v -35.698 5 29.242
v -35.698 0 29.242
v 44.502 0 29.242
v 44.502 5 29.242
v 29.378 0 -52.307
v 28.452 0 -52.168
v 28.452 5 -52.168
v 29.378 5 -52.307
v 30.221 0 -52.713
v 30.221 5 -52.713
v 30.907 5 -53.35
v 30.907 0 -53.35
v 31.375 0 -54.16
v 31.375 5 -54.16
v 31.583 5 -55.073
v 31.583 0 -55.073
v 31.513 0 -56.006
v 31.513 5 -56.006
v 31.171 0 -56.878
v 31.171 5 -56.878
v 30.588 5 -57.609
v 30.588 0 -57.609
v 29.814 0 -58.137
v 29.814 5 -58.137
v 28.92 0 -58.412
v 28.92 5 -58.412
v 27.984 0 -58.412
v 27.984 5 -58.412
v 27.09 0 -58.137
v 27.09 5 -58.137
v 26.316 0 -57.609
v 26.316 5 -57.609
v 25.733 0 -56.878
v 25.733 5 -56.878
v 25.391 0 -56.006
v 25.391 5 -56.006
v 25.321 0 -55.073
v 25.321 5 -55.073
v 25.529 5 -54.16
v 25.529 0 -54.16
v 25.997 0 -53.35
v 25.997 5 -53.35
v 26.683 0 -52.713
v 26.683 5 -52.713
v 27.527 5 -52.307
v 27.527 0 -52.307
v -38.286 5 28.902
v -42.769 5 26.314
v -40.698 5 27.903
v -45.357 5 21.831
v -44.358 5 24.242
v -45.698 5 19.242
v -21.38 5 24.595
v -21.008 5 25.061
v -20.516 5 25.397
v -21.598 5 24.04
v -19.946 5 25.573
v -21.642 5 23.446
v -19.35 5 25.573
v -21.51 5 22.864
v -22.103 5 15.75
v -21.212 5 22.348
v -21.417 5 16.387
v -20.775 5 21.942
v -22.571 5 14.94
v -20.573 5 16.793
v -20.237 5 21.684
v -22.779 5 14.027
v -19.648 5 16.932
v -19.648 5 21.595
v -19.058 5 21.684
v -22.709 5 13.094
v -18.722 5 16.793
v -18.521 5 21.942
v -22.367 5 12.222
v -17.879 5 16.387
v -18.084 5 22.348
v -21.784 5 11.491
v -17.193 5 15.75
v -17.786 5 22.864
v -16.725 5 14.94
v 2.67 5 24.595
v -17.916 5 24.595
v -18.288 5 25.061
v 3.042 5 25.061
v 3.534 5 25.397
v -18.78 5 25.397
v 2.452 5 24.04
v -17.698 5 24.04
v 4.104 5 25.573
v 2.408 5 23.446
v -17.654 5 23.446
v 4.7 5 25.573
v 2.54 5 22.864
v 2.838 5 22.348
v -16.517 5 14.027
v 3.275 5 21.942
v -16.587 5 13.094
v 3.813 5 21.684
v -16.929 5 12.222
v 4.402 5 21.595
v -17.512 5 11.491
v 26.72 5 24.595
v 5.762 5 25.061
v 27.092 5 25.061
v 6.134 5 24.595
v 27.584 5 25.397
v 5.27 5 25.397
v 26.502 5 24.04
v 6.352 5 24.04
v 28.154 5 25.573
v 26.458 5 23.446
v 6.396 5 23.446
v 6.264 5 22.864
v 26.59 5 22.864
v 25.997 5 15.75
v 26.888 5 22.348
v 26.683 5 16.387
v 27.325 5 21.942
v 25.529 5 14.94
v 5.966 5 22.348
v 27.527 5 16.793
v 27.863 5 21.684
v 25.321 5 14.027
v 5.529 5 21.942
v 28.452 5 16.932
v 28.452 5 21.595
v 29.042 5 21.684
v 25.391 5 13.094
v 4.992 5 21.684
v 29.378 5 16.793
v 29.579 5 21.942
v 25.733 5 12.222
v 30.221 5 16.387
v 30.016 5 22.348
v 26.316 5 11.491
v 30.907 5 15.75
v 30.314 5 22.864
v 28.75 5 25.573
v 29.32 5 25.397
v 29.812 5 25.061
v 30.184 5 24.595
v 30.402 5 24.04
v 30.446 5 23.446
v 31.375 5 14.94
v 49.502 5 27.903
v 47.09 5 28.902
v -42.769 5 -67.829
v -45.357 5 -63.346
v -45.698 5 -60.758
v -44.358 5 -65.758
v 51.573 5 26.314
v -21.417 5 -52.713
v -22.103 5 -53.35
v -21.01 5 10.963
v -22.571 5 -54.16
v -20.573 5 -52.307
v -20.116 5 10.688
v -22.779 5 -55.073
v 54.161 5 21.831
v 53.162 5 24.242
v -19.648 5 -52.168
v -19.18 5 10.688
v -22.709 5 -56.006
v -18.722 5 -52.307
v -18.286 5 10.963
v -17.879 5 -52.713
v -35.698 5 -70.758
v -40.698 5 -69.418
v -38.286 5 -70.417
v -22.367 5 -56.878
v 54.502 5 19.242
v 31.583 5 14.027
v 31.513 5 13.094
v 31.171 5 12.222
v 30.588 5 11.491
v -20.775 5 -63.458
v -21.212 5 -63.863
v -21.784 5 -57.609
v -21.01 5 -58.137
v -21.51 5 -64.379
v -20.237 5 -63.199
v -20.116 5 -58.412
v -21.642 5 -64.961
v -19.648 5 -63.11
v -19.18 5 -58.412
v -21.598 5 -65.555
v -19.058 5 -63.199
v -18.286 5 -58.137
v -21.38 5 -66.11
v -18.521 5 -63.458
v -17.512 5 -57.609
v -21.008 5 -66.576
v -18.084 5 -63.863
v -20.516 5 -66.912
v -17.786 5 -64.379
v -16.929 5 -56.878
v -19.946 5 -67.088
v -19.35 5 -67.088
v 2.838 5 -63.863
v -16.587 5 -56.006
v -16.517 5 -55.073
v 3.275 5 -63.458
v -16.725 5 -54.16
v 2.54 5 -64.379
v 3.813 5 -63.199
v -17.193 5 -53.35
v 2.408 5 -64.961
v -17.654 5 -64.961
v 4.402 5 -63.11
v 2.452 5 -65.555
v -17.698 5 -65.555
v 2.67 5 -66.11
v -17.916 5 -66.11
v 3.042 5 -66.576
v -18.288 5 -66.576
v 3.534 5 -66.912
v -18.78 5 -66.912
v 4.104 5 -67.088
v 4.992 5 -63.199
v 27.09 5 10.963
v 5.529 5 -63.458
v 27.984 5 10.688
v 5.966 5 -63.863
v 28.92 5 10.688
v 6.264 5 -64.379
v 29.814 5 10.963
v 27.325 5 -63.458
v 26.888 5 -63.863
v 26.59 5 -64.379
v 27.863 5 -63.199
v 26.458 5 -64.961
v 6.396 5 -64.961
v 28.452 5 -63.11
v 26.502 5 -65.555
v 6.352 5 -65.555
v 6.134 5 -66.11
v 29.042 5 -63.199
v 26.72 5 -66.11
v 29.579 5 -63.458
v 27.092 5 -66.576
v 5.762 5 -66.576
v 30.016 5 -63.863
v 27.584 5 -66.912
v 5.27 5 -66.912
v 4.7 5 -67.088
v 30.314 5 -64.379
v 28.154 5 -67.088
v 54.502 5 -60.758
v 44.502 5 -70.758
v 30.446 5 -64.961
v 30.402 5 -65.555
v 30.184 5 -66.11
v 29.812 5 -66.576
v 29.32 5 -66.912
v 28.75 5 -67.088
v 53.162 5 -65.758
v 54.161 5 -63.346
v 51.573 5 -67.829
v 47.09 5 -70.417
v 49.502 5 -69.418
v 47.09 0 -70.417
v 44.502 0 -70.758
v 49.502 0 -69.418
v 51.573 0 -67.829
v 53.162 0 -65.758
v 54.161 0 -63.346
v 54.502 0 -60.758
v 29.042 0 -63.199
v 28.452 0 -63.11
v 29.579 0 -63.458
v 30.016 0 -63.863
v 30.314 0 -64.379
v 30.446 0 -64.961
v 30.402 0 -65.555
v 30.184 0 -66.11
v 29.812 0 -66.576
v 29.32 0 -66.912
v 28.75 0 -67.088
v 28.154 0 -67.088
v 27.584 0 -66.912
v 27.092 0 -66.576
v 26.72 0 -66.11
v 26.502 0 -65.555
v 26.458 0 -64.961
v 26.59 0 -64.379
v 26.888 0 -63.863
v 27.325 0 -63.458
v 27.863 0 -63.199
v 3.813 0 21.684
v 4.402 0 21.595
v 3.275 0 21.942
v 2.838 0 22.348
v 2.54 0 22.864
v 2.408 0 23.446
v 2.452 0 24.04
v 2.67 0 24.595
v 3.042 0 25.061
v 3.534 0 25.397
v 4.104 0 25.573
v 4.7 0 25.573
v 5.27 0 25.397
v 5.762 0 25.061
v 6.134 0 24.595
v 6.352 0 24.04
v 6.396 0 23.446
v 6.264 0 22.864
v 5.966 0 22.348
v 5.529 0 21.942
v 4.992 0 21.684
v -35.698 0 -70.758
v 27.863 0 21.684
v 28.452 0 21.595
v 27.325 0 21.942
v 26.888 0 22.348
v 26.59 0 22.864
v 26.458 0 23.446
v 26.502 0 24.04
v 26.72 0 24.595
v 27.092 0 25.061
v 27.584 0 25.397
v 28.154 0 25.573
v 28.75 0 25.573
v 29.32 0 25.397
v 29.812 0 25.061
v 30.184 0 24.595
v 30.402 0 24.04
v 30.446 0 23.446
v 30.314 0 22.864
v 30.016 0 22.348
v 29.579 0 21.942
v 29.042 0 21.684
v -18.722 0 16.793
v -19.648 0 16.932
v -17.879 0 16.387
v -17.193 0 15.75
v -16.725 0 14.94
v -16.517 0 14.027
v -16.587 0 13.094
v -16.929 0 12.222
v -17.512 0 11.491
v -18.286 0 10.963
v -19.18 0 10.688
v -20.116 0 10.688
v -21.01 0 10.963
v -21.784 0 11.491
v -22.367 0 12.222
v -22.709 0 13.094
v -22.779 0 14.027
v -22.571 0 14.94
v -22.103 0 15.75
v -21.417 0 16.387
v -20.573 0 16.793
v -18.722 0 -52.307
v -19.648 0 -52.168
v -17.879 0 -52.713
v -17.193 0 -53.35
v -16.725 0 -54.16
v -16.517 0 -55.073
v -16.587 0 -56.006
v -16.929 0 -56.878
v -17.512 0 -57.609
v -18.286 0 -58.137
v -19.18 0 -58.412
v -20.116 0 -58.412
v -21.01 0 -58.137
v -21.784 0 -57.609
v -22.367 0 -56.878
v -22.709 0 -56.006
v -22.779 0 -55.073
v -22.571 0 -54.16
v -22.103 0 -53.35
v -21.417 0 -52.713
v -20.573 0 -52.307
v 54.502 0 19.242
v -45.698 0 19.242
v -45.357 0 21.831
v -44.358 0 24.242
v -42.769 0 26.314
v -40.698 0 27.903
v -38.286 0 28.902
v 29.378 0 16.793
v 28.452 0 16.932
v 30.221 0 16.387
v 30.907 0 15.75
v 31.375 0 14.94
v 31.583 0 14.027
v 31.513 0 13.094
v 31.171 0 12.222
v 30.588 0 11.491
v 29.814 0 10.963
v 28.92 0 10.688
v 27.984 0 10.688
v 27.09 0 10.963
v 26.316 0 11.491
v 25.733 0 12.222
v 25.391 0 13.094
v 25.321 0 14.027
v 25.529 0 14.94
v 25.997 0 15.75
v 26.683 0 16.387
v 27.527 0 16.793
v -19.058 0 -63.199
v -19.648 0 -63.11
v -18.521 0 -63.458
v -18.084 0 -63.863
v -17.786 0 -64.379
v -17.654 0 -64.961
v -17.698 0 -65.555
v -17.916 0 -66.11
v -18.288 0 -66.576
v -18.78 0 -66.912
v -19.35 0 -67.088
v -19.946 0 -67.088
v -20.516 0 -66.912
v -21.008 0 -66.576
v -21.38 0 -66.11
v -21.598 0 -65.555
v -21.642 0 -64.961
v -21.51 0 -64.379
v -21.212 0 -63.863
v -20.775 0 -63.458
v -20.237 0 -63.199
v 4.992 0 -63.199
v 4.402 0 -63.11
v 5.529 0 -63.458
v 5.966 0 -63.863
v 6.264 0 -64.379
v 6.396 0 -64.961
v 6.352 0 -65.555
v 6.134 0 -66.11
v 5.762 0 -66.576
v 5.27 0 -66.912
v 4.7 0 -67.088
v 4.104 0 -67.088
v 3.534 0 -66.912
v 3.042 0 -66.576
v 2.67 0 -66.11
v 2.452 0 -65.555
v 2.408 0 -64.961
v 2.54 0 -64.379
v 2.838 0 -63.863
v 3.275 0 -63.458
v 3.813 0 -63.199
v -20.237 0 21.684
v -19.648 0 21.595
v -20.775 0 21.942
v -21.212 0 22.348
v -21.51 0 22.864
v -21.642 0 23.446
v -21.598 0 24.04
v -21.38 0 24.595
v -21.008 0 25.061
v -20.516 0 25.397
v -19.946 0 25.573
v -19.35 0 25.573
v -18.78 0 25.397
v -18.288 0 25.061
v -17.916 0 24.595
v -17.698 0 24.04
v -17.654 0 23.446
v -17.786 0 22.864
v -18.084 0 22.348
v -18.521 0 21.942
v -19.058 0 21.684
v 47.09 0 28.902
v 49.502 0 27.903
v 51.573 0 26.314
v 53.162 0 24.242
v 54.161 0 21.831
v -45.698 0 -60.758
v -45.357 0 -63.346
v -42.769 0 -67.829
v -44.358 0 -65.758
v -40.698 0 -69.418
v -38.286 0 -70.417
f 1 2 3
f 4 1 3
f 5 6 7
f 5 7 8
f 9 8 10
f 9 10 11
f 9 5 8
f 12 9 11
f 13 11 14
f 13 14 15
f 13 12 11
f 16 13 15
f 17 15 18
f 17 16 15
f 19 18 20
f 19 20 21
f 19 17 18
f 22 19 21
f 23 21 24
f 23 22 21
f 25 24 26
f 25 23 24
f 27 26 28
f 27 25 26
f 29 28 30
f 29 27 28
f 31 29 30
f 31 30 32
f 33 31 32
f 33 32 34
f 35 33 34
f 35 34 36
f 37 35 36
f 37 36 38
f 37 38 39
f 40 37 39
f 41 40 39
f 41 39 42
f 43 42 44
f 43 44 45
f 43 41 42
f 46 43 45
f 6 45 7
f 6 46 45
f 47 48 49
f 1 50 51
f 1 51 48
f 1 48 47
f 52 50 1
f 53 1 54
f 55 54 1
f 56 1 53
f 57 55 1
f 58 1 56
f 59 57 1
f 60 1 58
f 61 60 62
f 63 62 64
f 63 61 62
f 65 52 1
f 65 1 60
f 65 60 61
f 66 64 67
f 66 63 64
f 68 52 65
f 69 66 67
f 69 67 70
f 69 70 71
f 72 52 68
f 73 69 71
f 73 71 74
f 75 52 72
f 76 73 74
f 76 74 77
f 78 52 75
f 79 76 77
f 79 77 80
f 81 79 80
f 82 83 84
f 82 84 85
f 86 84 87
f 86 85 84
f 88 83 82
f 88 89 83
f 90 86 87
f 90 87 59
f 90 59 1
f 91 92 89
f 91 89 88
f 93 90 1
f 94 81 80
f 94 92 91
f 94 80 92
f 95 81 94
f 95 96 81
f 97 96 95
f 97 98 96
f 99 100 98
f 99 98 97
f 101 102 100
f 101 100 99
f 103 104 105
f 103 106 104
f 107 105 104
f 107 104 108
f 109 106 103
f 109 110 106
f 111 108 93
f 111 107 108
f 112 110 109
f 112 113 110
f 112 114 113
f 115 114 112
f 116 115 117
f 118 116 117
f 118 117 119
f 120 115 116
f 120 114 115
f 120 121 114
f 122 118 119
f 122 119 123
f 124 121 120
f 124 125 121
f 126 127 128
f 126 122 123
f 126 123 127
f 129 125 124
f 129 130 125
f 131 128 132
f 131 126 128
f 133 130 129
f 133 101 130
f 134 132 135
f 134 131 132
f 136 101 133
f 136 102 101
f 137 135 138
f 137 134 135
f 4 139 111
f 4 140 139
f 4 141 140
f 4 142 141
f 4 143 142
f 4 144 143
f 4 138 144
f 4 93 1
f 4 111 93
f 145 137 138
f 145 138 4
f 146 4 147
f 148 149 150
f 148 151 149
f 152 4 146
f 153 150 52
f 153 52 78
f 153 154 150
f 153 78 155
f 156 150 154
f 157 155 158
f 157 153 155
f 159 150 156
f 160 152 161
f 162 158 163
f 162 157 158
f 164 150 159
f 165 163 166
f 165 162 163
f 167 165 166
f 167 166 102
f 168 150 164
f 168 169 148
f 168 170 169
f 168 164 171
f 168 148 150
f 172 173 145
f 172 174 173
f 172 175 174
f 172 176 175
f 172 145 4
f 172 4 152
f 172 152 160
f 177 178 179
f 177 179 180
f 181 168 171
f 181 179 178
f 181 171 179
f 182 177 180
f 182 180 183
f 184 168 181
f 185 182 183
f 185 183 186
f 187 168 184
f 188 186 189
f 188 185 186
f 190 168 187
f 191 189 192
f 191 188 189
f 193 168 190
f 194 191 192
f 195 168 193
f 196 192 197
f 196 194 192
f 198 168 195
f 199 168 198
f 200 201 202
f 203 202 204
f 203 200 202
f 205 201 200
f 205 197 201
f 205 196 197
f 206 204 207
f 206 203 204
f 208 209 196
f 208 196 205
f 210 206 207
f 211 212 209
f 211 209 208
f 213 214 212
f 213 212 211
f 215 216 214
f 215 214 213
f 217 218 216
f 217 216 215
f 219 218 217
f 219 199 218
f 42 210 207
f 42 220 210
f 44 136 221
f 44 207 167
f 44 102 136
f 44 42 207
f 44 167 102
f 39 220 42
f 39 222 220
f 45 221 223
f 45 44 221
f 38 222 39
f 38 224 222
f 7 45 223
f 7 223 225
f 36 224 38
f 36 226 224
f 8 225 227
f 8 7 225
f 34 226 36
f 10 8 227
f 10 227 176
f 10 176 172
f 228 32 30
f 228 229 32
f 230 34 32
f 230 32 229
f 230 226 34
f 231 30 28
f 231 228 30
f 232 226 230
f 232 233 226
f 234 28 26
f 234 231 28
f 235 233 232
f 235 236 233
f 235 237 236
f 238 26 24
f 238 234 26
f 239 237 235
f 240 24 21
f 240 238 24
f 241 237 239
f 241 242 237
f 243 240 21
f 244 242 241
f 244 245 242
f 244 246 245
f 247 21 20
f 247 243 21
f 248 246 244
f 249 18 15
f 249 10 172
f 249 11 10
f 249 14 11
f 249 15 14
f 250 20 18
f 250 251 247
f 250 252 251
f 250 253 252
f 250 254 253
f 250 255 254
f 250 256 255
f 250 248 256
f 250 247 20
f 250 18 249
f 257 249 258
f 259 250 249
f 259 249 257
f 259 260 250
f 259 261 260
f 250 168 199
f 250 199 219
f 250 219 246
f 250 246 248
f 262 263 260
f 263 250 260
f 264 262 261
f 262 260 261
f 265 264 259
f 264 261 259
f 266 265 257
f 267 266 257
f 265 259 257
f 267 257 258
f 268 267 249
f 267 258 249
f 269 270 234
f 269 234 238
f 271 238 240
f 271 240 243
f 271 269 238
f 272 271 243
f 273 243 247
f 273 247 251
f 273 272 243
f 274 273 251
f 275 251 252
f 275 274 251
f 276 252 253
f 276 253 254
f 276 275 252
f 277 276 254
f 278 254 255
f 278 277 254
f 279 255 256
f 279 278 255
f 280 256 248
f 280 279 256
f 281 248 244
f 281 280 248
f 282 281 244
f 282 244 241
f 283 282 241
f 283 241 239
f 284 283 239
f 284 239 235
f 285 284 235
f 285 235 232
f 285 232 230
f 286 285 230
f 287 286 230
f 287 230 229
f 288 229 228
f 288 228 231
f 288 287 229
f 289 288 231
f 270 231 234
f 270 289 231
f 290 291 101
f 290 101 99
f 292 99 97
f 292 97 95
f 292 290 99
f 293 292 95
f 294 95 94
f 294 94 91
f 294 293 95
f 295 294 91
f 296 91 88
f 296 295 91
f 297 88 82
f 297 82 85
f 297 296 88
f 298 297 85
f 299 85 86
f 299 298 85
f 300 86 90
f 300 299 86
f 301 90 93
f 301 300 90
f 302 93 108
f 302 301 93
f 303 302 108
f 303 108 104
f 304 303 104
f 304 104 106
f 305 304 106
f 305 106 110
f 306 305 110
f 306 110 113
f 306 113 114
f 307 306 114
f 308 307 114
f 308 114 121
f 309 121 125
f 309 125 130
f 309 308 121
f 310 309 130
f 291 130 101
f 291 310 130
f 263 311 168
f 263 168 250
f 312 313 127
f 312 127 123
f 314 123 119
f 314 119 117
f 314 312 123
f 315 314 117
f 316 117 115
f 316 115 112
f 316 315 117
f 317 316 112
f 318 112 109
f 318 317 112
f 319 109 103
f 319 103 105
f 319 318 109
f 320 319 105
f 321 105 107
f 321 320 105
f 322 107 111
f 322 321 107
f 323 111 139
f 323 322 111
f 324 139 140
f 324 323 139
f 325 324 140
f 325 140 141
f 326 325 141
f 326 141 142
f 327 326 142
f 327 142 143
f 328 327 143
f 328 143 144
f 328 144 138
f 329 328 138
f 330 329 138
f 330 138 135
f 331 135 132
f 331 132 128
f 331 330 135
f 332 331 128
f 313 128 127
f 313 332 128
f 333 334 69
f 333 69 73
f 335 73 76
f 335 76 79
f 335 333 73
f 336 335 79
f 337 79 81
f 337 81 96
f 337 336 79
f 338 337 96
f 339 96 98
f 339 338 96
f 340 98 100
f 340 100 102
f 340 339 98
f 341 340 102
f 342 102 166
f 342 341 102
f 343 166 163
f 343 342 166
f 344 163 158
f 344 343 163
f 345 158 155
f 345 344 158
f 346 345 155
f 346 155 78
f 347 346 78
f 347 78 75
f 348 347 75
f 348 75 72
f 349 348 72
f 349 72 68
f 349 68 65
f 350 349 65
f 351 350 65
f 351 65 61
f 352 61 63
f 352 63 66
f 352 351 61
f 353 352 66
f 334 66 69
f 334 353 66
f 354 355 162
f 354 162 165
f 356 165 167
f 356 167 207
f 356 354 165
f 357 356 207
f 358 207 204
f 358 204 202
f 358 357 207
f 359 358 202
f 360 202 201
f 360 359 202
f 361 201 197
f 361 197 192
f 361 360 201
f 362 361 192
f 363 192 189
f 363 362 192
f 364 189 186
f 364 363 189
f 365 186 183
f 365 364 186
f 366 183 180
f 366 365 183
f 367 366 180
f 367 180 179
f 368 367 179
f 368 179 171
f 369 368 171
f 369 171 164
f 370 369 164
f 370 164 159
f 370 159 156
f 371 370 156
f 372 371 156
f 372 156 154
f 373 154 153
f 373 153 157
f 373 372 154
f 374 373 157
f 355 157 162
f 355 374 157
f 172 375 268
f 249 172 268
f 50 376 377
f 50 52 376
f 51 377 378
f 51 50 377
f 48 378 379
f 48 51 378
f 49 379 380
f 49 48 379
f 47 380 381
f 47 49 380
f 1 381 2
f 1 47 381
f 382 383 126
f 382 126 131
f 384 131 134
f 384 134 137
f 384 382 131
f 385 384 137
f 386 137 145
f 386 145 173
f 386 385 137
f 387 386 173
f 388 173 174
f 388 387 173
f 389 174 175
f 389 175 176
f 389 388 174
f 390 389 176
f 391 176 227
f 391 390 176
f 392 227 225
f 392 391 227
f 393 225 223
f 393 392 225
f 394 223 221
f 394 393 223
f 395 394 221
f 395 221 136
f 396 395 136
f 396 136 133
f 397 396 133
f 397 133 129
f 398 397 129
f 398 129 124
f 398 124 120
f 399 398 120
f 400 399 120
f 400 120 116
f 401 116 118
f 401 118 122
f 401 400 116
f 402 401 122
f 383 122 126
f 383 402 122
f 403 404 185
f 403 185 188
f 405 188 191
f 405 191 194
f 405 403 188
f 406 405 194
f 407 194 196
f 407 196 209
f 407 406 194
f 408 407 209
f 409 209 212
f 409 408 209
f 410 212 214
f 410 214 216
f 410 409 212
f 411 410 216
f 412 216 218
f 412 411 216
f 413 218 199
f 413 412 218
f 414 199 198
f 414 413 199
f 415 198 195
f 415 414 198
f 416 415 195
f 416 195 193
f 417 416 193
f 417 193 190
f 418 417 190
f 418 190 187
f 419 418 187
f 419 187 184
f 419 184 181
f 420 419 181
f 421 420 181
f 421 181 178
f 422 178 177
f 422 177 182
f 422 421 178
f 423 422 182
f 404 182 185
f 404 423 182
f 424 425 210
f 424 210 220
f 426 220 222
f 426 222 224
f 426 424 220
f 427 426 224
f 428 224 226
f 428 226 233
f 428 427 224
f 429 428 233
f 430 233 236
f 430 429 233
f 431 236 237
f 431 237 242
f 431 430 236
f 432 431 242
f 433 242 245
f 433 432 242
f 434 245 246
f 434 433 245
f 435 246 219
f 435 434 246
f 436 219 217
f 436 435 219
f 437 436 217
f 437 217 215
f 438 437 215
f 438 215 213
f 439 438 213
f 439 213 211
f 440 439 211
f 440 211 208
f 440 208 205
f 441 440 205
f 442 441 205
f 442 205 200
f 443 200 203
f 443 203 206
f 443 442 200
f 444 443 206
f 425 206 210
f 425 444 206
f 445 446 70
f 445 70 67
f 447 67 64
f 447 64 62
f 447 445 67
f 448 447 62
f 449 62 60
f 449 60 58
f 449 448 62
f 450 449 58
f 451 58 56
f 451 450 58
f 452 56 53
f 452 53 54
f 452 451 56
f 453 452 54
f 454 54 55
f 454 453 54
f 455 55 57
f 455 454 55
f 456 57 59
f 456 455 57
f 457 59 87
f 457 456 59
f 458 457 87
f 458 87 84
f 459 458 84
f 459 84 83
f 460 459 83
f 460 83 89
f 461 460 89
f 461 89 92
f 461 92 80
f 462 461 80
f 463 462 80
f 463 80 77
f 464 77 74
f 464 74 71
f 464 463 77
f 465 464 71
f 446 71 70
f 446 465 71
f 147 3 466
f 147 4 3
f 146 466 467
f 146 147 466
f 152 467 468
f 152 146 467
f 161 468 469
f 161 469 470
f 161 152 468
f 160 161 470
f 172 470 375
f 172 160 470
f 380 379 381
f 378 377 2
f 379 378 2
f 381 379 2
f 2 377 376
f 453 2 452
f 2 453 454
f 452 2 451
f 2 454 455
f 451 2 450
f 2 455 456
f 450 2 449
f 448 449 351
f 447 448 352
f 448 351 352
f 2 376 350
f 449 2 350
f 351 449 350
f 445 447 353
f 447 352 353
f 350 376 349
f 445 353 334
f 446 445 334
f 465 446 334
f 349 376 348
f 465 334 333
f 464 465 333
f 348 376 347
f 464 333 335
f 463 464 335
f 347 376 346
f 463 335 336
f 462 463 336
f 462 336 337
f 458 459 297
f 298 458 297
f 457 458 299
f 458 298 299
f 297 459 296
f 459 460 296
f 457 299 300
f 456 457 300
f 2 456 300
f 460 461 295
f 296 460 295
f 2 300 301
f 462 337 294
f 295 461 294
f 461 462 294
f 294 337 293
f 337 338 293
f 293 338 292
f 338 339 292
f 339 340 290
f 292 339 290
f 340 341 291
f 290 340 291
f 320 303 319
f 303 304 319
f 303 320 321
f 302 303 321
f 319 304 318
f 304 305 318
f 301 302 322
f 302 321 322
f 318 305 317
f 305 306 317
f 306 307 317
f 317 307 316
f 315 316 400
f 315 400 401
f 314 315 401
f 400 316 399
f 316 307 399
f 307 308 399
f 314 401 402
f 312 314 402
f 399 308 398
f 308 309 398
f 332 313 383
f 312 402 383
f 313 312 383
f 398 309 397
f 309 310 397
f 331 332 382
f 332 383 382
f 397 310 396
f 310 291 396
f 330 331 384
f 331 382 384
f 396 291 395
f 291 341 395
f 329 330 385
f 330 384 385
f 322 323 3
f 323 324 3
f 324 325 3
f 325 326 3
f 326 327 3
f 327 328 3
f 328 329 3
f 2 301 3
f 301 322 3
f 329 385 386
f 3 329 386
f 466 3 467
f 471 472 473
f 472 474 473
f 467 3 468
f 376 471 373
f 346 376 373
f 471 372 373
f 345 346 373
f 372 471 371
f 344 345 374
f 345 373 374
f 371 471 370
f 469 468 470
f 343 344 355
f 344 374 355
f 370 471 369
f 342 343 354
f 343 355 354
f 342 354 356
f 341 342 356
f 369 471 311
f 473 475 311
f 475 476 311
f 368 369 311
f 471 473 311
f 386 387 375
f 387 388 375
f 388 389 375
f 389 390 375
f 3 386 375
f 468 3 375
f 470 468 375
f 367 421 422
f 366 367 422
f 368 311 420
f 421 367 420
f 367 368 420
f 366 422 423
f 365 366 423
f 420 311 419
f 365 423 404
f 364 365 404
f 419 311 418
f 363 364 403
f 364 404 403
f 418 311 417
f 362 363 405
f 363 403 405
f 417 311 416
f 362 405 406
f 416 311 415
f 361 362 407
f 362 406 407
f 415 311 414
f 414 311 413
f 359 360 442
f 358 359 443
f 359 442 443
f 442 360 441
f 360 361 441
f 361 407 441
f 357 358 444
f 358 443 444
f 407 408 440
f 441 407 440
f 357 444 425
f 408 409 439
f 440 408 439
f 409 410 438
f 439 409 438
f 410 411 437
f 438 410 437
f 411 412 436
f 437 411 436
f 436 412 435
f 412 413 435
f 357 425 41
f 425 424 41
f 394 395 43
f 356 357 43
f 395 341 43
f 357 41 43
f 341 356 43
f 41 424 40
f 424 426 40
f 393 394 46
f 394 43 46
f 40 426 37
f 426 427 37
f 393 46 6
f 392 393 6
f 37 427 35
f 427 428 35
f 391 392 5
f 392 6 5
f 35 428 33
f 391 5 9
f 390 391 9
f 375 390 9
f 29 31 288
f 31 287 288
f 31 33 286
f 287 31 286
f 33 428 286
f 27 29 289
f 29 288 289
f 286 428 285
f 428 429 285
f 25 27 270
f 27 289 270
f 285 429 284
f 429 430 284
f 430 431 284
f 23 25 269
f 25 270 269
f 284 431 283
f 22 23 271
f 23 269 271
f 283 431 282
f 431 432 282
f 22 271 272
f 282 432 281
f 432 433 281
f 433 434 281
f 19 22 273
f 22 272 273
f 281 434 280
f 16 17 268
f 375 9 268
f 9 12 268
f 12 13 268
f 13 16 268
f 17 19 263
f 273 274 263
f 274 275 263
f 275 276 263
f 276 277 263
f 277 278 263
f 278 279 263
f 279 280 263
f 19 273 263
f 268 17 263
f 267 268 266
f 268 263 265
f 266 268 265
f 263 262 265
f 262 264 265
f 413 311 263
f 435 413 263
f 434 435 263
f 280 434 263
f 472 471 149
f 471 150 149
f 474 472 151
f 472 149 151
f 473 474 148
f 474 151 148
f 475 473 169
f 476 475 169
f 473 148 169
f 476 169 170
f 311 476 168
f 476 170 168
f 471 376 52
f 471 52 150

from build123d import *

# Parameters (mm, degrees)
SKETCH_1_W      = 100.2
SKETCH_1_H      = 100
SKETCH_1_R      = 3.14
SKETCH_1_R_2    = 2
EXTRUDE_1_DEPTH = 5
FILLET_1_R      = 10


with BuildPart() as part:
    # 草图1 → 凸台-拉伸1 (new body)
    with BuildSketch(Plane(origin=(0, 0, 0), x_dir=(1, 0, 0), z_dir=(0, 1, 0))):
        with Locations((4.40209205, 20.757531381)):
            Rectangle(SKETCH_1_W, SKETCH_1_H)
        with Locations(Location((-19.64790795, 55.307531381, 0), (0, 0, 270))):
            Circle(SKETCH_1_R, mode=Mode.SUBTRACT)
        with Locations(Location((28.45209205, 55.307531381, 0), (0, 0, 270))):
            Circle(SKETCH_1_R, mode=Mode.SUBTRACT)
        with Locations(Location((28.45209205, -13.792468619, 0), (0, 0, 270))):
            Circle(SKETCH_1_R, mode=Mode.SUBTRACT)
        with Locations(Location((-19.64790795, -13.792468619, 0), (0, 0, 270))):
            Circle(SKETCH_1_R, mode=Mode.SUBTRACT)
        with Locations(Location((-19.64790795, 65.110023284, 0), (0, 0, 270))):
            Circle(SKETCH_1_R_2, mode=Mode.SUBTRACT)
        with Locations(Location((4.40209205, 65.110023284, 0), (0, 0, 270))):
            Circle(SKETCH_1_R_2, mode=Mode.SUBTRACT)
        with Locations(Location((28.45209205, 65.110023284, 0), (0, 0, 270))):
            Circle(SKETCH_1_R_2, mode=Mode.SUBTRACT)
        with Locations(Location((28.45209205, -23.594960523, 0), (0, 0, 90))):
            Circle(SKETCH_1_R_2, mode=Mode.SUBTRACT)
        with Locations(Location((4.40209205, -23.594960523, 0), (0, 0, 90))):
            Circle(SKETCH_1_R_2, mode=Mode.SUBTRACT)
        with Locations(Location((-19.64790795, -23.594960523, 0), (0, 0, 90))):
            Circle(SKETCH_1_R_2, mode=Mode.SUBTRACT)
    extrude(amount=EXTRUDE_1_DEPTH)

    # 圆角1
    fillet_1_edges = [part.edges().sort_by_distance(p)[0] for p in [
        (-45.69790795, 2.5, -70.757531381),
        (54.50209205, 2.5, -70.757531381),
        (54.50209205, 2.5, 29.242468619),
        (-45.69790795, 2.5, 29.242468619),
    ]]
    fillet(fillet_1_edges, radius=FILLET_1_R)


solid = part.part
